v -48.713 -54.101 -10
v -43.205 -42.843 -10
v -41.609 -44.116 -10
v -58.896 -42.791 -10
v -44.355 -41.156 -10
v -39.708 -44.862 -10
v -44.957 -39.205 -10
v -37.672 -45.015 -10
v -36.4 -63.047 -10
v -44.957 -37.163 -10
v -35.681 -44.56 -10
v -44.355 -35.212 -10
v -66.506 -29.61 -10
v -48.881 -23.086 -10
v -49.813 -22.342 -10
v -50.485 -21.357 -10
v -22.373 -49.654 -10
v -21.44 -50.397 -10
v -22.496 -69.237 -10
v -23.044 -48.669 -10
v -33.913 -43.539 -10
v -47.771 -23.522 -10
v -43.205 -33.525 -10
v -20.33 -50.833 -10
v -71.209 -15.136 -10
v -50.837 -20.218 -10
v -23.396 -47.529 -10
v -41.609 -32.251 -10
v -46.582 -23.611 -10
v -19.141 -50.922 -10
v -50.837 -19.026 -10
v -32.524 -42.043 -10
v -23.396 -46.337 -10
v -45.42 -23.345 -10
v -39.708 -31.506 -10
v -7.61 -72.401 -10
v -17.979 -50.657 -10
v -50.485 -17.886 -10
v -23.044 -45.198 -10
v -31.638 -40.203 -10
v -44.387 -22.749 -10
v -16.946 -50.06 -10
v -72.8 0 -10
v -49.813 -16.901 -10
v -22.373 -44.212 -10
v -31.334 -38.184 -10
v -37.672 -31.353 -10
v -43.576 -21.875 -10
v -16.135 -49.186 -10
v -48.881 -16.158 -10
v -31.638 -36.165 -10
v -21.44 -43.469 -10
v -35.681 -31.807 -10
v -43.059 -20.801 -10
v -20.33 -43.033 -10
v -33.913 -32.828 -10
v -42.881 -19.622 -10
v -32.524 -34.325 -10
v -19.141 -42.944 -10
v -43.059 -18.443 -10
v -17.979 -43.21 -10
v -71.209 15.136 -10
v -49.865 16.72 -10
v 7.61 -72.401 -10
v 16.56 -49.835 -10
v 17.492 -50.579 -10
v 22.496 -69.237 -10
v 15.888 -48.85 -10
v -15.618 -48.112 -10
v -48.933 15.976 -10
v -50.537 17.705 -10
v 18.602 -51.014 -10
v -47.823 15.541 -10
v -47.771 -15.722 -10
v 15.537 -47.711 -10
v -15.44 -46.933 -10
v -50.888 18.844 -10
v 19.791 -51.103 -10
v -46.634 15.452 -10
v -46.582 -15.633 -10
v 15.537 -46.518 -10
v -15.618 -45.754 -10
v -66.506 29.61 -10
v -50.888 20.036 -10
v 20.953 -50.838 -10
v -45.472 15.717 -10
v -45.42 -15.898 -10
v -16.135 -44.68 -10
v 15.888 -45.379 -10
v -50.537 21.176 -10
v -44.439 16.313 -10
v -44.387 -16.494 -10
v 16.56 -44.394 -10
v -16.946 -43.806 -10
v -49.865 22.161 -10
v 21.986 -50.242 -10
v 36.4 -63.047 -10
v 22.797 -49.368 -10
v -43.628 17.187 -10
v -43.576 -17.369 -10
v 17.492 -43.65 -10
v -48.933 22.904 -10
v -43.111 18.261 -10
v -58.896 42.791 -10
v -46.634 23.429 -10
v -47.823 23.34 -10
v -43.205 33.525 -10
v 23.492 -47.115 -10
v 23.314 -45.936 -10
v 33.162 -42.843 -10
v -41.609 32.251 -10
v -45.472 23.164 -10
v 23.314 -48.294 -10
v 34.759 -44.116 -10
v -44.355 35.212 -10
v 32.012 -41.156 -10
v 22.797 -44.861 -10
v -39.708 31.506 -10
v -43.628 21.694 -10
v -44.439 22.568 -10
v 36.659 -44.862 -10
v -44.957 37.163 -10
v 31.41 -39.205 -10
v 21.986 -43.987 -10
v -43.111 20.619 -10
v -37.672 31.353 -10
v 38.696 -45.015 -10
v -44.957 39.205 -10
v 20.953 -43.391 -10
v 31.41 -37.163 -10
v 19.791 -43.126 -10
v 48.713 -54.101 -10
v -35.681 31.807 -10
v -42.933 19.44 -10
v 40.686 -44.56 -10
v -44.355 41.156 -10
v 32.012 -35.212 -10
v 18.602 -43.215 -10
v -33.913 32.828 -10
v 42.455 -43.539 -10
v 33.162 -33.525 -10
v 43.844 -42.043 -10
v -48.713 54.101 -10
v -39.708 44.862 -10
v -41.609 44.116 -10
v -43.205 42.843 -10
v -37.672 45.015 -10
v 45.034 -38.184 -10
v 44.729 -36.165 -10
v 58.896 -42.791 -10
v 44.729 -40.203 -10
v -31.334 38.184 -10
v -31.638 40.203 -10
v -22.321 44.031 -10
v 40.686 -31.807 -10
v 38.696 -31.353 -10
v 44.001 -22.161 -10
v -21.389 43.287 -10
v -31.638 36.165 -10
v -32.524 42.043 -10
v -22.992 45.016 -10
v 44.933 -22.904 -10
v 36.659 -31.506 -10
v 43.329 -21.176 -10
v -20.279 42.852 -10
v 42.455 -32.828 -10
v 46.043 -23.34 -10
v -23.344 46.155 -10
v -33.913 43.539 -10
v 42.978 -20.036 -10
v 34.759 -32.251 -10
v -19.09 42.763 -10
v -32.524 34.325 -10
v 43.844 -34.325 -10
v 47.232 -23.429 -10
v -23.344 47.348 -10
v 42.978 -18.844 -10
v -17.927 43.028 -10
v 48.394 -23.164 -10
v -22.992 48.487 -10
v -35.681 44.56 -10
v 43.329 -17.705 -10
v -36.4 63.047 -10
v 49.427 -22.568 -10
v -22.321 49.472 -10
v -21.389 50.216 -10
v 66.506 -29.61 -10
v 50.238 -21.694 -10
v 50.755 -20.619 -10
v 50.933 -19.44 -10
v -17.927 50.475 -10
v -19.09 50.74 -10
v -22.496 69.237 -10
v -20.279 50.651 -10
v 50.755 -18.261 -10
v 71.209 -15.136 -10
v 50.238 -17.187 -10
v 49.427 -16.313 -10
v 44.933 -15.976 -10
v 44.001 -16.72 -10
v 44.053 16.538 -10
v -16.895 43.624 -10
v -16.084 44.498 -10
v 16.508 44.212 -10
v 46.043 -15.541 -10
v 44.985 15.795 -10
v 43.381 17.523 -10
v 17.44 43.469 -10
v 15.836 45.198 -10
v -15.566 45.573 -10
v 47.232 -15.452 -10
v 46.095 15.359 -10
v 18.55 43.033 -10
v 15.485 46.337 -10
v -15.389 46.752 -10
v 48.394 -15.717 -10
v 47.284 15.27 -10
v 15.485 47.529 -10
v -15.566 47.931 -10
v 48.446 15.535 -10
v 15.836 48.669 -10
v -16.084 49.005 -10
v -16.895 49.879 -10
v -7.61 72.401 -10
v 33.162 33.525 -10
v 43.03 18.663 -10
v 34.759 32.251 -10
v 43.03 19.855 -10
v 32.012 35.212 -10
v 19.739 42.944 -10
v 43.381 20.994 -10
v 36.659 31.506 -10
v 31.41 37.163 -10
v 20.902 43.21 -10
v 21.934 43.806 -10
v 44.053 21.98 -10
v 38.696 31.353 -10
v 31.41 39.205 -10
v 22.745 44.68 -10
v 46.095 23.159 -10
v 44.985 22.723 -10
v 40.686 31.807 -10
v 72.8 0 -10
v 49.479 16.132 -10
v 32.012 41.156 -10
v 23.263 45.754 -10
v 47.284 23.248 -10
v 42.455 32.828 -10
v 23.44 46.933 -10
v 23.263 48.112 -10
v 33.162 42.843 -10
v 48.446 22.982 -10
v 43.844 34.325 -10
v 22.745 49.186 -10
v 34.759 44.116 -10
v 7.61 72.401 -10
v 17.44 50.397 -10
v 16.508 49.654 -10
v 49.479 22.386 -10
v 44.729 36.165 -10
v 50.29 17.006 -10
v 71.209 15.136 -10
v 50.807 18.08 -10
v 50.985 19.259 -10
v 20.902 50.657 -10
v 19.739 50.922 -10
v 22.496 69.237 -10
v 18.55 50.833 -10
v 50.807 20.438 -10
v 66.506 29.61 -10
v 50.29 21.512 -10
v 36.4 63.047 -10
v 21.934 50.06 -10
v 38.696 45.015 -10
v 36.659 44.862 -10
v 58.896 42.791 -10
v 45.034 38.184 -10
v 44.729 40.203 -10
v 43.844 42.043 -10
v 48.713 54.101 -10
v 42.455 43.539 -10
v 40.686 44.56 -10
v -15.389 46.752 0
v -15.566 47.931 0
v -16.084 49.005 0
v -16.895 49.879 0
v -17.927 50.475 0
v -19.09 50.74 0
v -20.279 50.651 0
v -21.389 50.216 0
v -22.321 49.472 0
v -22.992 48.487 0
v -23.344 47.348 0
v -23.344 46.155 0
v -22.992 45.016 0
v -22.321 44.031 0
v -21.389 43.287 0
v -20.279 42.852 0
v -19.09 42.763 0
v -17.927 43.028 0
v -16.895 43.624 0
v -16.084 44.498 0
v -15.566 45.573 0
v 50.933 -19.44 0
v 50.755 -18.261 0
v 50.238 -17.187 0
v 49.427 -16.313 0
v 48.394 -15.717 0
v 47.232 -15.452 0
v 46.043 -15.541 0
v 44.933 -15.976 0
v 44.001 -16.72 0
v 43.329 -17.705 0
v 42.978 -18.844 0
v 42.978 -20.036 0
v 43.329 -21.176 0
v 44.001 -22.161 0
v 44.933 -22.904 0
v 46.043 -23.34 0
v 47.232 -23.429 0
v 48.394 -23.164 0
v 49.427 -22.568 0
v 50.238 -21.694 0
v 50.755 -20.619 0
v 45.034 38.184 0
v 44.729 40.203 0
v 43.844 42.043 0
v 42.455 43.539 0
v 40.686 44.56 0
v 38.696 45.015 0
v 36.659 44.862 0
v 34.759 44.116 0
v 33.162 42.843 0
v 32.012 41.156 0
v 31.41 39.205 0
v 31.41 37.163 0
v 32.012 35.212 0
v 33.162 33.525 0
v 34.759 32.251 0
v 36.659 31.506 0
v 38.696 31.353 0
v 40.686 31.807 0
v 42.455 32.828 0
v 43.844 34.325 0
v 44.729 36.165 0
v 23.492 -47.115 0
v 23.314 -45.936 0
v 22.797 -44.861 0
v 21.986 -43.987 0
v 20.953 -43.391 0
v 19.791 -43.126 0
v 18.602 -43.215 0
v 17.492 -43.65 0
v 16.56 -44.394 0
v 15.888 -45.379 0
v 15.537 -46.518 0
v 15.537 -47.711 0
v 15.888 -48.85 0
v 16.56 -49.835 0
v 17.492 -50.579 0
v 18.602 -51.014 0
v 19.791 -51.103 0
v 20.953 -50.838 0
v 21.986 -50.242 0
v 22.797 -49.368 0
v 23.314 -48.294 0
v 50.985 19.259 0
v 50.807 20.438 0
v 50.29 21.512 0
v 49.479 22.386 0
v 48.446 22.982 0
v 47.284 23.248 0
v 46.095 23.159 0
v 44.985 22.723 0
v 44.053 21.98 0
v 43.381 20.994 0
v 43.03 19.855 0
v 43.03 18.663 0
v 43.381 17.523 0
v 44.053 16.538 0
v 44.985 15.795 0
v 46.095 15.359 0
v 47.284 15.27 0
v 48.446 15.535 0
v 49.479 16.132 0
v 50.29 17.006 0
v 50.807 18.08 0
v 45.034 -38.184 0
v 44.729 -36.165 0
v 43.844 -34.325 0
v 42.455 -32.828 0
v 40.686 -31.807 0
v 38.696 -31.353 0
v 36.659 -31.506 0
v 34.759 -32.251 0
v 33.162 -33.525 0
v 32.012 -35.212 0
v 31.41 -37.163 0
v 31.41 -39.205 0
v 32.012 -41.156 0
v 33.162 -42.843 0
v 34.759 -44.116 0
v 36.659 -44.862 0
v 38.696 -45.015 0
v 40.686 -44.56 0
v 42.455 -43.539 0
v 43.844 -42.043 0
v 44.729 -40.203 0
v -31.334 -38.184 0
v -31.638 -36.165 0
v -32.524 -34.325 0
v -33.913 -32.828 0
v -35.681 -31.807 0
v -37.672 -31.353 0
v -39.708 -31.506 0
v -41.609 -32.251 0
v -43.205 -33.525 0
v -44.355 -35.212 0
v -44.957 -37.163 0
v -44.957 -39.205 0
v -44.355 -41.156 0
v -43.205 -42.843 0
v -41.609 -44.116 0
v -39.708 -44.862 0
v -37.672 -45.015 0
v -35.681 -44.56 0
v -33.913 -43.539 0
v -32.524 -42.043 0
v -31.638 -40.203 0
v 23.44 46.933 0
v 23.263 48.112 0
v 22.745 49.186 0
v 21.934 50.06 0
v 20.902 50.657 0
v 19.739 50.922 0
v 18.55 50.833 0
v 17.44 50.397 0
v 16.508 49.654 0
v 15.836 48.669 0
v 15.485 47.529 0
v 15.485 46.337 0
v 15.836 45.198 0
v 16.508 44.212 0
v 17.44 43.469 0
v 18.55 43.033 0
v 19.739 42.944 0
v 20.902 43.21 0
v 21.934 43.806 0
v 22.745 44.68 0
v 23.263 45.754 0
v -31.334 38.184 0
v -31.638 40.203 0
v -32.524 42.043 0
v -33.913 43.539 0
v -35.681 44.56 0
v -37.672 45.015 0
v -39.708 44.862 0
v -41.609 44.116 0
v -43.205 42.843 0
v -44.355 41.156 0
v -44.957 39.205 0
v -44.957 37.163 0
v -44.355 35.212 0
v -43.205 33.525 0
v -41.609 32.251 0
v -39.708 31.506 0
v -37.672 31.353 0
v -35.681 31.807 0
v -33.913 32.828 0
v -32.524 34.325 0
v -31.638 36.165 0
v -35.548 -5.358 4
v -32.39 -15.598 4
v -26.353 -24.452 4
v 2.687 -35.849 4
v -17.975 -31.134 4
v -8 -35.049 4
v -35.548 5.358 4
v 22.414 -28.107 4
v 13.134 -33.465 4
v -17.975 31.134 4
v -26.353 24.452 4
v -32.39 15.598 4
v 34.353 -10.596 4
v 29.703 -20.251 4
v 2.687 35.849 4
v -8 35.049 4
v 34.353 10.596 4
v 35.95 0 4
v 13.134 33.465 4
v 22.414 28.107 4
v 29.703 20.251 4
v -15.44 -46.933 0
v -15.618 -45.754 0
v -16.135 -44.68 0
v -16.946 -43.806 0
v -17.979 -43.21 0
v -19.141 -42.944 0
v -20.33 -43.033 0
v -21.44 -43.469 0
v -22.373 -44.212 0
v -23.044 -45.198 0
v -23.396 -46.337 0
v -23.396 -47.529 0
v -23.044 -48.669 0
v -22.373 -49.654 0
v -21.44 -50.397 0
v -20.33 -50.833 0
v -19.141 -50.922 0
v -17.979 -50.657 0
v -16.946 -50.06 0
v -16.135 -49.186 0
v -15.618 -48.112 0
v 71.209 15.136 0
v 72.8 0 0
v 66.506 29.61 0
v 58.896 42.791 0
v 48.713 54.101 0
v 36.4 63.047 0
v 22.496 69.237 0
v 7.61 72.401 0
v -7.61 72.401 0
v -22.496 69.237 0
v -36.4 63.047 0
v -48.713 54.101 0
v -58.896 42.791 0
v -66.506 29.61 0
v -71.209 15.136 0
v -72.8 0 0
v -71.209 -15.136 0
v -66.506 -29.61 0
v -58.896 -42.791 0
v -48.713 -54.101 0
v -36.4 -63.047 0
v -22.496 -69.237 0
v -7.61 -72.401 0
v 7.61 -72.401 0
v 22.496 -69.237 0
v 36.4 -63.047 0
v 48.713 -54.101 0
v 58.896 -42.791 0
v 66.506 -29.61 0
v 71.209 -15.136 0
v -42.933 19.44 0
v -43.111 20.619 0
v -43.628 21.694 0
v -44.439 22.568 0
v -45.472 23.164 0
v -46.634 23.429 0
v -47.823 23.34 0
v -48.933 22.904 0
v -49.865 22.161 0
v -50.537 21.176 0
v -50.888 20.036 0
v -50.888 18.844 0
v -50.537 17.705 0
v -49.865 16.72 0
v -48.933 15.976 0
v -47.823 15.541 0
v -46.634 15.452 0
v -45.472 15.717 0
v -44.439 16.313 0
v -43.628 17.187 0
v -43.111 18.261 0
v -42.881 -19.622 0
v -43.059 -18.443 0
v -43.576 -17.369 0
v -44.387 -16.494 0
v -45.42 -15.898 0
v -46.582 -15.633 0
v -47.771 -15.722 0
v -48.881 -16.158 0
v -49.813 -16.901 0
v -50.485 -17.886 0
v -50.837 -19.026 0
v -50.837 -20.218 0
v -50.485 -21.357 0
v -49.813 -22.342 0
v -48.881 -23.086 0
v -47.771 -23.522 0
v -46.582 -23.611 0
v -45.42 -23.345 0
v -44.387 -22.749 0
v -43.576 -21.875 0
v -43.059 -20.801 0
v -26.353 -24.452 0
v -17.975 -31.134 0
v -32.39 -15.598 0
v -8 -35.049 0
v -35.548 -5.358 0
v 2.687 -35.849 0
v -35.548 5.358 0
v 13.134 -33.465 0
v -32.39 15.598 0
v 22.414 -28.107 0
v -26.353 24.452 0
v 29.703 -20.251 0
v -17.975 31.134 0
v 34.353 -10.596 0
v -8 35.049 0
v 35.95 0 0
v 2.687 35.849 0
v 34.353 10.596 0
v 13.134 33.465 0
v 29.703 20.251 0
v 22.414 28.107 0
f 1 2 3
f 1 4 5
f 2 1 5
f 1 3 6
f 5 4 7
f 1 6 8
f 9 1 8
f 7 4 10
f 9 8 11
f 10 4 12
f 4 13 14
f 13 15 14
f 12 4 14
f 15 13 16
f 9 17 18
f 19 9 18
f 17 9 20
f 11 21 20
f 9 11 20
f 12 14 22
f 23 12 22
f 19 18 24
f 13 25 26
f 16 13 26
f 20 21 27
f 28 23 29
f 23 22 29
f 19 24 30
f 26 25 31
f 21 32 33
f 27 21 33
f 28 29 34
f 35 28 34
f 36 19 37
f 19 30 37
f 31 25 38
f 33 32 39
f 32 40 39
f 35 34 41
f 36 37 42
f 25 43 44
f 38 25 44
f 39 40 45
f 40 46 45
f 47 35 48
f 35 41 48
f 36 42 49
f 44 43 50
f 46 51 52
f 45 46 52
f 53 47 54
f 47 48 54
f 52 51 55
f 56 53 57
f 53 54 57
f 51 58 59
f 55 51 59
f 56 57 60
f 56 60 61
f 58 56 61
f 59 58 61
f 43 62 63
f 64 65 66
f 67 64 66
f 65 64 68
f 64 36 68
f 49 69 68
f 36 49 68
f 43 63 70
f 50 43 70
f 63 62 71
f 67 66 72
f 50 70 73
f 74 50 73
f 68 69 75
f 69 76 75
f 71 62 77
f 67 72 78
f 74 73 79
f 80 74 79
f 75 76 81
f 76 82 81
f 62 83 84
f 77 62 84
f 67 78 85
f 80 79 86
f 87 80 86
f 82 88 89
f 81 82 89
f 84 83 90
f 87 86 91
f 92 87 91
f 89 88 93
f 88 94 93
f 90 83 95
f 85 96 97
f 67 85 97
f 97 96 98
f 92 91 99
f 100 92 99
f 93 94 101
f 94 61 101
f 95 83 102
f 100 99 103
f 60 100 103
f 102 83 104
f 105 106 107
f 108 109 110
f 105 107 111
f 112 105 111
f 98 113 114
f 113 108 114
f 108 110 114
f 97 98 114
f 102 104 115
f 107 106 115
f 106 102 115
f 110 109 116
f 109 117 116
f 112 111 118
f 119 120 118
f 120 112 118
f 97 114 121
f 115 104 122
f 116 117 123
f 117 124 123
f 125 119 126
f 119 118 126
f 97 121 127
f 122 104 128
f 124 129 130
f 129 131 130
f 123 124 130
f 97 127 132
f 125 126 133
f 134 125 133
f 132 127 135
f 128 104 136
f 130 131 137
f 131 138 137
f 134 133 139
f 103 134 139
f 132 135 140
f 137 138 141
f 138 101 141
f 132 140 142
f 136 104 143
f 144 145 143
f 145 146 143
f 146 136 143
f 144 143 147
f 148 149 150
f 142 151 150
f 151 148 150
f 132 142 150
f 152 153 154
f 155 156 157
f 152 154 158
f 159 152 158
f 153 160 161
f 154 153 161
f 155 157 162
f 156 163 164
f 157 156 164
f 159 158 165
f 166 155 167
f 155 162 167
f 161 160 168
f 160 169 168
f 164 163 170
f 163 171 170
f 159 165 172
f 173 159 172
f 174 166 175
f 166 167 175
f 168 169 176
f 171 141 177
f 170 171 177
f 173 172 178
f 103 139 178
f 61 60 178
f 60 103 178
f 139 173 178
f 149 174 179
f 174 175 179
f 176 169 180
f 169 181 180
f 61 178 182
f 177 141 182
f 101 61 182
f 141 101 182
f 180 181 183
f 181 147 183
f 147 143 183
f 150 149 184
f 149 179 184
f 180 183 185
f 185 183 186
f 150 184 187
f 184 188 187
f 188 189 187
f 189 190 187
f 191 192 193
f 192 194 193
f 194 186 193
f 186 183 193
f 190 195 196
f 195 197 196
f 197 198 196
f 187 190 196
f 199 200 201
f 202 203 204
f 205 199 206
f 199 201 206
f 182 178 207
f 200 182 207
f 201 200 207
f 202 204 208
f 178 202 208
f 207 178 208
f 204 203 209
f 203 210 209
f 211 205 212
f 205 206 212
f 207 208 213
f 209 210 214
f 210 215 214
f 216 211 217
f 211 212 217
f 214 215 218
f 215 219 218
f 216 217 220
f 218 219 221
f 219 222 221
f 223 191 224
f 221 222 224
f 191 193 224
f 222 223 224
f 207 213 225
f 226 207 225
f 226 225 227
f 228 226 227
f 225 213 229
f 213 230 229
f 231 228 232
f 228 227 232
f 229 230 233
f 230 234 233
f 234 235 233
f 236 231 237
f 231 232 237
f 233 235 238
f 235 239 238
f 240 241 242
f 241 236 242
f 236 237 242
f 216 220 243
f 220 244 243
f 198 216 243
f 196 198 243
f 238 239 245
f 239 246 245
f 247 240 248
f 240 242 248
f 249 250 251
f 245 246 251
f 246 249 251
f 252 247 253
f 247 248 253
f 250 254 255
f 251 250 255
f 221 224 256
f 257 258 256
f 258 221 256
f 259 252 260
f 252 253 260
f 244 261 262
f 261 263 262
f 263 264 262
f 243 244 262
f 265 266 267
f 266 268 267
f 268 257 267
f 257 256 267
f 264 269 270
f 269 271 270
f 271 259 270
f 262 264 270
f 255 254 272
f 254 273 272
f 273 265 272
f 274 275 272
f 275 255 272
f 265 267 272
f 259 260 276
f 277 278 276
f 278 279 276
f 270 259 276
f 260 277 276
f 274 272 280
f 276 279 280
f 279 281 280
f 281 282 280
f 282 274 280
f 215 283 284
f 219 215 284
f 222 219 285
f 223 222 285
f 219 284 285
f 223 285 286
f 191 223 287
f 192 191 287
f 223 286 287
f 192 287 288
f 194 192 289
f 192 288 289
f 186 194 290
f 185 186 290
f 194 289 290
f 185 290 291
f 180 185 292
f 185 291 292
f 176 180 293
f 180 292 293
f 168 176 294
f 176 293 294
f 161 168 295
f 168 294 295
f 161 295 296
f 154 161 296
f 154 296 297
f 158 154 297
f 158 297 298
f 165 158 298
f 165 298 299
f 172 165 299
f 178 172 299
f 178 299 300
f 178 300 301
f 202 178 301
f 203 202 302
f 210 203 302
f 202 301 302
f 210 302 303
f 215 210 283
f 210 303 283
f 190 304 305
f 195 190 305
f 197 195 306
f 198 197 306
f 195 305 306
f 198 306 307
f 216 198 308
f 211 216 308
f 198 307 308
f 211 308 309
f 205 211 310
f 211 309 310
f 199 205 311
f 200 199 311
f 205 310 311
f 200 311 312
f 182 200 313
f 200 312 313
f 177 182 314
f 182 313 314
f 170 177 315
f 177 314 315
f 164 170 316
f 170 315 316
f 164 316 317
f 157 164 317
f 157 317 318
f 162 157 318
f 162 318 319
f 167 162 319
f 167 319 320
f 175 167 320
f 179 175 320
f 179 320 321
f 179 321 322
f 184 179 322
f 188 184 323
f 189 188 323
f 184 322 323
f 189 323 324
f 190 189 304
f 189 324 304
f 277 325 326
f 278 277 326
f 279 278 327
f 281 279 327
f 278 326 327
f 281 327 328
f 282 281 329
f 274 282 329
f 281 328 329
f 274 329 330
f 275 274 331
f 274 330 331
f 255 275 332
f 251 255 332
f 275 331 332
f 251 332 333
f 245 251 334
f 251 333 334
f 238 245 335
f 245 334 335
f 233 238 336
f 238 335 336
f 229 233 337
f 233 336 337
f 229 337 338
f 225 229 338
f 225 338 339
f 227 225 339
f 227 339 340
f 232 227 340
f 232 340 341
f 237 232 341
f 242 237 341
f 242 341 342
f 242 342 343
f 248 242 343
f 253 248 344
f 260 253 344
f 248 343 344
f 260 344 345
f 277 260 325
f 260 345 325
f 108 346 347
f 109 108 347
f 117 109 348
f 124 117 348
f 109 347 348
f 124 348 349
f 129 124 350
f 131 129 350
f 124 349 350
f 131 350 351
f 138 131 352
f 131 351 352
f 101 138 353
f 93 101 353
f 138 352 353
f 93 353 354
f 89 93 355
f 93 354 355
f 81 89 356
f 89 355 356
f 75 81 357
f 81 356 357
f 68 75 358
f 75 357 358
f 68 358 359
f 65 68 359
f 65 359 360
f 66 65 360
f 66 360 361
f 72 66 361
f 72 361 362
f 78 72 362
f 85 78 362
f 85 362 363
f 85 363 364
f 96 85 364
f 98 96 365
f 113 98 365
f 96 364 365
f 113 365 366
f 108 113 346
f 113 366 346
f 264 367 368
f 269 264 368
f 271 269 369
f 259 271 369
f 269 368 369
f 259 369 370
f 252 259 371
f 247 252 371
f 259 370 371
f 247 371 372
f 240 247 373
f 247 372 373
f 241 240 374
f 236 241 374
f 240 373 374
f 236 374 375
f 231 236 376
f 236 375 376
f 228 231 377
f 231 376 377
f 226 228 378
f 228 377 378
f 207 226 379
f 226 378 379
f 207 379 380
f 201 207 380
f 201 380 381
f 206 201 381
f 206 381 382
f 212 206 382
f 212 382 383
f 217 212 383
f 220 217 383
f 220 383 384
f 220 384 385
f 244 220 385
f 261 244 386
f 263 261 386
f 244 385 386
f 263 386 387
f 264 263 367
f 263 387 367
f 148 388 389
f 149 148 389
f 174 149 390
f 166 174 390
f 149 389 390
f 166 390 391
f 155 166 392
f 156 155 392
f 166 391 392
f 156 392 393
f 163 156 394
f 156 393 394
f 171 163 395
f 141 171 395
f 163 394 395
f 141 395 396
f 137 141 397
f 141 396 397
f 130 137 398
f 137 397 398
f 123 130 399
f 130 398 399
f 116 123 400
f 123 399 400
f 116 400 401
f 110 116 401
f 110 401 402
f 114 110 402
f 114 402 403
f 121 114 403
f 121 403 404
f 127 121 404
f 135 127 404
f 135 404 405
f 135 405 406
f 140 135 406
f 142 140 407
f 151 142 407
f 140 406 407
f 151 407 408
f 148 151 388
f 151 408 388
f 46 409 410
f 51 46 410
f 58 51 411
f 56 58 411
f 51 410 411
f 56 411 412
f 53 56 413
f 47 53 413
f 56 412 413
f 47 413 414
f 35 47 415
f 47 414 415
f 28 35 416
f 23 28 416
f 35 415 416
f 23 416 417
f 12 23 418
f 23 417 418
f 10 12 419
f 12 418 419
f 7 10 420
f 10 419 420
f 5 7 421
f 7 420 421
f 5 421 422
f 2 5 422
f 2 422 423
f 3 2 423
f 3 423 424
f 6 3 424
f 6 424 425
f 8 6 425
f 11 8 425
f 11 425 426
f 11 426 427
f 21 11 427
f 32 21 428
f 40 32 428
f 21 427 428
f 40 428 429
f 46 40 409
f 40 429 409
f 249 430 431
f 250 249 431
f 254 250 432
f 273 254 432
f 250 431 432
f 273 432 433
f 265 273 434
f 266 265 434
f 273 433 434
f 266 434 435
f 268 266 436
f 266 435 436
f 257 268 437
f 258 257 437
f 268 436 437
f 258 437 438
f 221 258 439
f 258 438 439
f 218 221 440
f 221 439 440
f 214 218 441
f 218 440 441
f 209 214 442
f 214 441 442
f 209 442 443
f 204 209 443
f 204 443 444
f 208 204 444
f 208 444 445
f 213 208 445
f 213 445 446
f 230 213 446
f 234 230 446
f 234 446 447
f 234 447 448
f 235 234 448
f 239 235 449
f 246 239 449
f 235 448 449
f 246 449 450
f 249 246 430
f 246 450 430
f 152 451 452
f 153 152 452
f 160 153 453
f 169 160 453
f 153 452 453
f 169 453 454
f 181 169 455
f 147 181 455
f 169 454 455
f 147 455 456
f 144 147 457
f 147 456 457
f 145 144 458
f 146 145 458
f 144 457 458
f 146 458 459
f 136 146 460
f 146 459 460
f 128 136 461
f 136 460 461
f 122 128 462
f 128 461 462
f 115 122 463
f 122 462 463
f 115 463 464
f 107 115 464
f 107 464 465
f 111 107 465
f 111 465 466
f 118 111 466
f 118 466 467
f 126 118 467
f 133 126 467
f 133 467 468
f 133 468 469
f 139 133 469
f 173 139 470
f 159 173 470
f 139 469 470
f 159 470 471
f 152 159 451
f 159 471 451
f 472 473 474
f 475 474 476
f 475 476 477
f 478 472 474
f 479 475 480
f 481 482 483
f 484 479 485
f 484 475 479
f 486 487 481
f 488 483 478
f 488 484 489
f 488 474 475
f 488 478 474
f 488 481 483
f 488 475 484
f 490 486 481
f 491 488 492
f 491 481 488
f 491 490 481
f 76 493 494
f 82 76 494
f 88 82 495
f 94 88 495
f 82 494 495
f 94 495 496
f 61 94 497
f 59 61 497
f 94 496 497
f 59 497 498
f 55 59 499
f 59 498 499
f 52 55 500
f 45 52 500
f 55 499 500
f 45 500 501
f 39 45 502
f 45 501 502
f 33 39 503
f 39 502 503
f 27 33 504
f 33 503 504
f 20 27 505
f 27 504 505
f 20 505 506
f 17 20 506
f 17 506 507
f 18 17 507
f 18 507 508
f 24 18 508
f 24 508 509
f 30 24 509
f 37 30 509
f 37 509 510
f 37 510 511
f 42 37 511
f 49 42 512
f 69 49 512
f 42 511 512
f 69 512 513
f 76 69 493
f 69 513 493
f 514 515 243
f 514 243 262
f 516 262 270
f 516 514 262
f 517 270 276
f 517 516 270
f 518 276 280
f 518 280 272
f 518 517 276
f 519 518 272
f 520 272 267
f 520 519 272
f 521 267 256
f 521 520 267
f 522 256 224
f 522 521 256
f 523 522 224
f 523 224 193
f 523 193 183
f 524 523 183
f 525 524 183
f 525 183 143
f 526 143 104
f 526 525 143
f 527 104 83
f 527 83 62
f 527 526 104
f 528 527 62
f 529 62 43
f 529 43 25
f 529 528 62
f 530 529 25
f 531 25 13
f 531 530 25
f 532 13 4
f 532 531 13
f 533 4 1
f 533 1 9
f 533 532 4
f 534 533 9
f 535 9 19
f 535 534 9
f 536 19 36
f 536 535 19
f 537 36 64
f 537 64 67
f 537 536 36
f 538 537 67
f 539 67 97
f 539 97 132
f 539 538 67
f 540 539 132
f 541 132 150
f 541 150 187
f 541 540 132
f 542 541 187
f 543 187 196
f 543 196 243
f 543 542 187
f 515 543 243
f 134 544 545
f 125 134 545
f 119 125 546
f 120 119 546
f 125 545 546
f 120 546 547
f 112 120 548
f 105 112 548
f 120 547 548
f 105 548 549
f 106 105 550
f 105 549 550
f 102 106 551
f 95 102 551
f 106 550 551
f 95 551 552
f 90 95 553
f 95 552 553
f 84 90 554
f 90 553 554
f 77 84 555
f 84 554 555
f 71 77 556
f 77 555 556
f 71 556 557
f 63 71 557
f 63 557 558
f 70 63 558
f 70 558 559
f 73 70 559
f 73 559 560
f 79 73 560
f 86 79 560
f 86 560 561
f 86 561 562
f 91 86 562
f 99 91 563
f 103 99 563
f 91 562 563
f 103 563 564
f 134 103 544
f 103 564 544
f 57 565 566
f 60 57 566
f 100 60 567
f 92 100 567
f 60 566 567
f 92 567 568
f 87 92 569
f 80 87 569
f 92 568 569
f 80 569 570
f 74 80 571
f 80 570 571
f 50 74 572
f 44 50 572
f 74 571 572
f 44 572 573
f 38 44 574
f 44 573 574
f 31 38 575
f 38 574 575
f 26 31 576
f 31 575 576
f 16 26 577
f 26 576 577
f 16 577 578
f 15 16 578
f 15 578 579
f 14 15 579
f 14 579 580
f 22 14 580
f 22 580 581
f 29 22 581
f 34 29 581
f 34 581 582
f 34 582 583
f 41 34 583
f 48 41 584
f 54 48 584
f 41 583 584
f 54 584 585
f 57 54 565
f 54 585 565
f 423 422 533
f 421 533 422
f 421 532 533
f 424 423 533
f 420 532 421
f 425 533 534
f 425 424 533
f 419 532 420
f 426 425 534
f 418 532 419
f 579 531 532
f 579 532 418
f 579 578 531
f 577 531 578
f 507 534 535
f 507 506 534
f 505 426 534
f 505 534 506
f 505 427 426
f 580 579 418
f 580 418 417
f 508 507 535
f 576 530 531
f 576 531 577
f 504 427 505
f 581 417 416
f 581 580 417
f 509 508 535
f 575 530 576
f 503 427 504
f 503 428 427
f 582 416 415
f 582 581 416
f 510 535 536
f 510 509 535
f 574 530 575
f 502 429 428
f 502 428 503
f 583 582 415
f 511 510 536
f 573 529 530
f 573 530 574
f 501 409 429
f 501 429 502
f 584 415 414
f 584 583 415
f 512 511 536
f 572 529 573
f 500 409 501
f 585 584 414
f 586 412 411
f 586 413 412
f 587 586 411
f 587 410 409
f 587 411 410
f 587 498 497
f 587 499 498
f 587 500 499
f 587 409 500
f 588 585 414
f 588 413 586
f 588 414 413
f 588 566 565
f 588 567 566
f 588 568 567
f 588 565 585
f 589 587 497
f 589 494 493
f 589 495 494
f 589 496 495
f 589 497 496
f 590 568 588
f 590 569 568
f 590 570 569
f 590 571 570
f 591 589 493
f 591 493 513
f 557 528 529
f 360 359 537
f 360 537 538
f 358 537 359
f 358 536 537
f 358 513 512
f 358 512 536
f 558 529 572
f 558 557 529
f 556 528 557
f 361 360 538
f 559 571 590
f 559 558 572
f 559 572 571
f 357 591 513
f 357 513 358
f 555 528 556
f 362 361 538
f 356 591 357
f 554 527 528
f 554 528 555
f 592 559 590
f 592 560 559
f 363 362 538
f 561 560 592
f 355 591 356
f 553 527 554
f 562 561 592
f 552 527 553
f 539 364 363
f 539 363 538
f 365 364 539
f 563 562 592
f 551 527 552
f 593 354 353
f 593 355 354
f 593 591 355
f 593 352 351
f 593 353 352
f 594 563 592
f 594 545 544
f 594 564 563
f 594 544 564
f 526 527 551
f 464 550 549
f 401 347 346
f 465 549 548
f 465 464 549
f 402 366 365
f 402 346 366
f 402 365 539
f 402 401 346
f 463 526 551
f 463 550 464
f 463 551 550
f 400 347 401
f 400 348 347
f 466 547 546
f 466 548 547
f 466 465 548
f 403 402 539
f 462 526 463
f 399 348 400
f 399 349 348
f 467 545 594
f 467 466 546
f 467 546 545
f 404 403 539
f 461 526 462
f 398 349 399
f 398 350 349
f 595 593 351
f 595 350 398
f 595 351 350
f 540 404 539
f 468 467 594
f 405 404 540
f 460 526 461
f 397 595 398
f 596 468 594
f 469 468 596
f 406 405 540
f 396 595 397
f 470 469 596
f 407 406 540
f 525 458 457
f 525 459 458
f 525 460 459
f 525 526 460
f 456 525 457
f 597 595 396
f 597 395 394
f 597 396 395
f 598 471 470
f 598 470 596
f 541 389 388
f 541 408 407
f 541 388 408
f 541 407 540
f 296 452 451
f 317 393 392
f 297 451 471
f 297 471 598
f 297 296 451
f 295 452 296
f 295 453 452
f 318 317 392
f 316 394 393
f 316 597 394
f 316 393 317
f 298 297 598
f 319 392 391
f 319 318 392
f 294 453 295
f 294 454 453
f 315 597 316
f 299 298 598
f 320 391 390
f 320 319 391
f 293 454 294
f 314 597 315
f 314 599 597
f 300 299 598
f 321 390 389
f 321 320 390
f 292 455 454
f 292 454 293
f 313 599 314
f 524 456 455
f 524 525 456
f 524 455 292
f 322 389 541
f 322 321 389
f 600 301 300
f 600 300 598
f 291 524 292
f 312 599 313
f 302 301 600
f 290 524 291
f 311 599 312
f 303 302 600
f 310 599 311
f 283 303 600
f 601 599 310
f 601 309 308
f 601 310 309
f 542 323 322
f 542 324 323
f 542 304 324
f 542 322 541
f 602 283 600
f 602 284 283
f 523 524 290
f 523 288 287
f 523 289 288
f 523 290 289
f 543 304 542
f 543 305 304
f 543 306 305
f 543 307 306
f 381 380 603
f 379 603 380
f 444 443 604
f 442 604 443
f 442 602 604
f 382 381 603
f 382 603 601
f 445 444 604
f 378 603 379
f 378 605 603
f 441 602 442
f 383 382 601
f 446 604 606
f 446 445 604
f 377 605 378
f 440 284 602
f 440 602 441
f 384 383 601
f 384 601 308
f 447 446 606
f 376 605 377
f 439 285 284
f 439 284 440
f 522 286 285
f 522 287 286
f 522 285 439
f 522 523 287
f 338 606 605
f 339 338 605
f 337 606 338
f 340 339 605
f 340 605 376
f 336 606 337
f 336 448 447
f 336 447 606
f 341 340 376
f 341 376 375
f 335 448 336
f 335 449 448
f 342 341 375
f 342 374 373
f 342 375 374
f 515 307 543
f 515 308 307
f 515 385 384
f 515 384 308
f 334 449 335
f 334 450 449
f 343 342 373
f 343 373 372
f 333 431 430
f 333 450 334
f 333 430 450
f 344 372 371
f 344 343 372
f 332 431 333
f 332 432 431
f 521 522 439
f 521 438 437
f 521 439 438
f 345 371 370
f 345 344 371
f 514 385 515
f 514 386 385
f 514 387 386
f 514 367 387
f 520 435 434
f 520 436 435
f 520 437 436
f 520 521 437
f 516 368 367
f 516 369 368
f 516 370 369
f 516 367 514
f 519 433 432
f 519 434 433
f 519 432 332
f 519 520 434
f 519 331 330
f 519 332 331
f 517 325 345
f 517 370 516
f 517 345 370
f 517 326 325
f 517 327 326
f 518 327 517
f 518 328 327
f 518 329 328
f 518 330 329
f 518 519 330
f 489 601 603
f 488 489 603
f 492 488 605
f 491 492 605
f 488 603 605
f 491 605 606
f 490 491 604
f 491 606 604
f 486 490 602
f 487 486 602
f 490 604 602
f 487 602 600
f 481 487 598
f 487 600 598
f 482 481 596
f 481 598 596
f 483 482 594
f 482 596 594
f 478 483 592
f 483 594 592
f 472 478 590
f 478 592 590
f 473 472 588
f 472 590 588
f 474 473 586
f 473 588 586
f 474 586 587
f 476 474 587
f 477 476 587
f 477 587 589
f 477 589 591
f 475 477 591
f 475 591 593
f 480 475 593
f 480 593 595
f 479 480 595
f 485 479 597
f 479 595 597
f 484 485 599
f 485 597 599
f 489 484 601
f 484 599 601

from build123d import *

# Parameters (mm, degrees)
F0_R     = 72.8
F0_R_2   = 6.85
F0_R_3   = 4
F0_R_4   = 35.95
F1_DEPTH = 10
F2_DEPTH = 4


with BuildPart() as f1:
    # F0 (on Top) → F1 (new body)
    with BuildSketch(Plane.XY):
        Circle(F0_R)
        with Locations((-38.183766, -38.183766)):
            Circle(F0_R_2, mode=Mode.SUBTRACT)
        with Locations((-19.440318, -46.93308)):
            Circle(F0_R_3, mode=Mode.SUBTRACT)
        with Locations((-46.881264, -19.621801)):
            Circle(F0_R_3, mode=Mode.SUBTRACT)
        Circle(F0_R_4, mode=Mode.SUBTRACT)
        with Locations((19.492135, -47.114563)):
            Circle(F0_R_3, mode=Mode.SUBTRACT)
        with Locations((38.183766, -38.183766)):
            Circle(F0_R_2, mode=Mode.SUBTRACT)
        with Locations((46.93308, -19.440318)):
            Circle(F0_R_3, mode=Mode.SUBTRACT)
        with Locations((-46.93308, 19.440318)):
            Circle(F0_R_3, mode=Mode.SUBTRACT)
        with Locations((-38.183766, 38.183766)):
            Circle(F0_R_2, mode=Mode.SUBTRACT)
        with Locations((-19.388502, 46.751597)):
            Circle(F0_R_3, mode=Mode.SUBTRACT)
        with Locations((46.984896, 19.258835)):
            Circle(F0_R_3, mode=Mode.SUBTRACT)
        with Locations((19.440318, 46.93308)):
            Circle(F0_R_3, mode=Mode.SUBTRACT)
        with Locations((38.183766, 38.183766)):
            Circle(F0_R_2, mode=Mode.SUBTRACT)
        Circle(F0_R_4)
    extrude(amount=-F1_DEPTH)

    # F0 (on Top) → F2 (join)
    with BuildSketch(Plane.XY):
        Circle(F0_R_4)
    extrude(amount=F2_DEPTH)


solid = f1.part
